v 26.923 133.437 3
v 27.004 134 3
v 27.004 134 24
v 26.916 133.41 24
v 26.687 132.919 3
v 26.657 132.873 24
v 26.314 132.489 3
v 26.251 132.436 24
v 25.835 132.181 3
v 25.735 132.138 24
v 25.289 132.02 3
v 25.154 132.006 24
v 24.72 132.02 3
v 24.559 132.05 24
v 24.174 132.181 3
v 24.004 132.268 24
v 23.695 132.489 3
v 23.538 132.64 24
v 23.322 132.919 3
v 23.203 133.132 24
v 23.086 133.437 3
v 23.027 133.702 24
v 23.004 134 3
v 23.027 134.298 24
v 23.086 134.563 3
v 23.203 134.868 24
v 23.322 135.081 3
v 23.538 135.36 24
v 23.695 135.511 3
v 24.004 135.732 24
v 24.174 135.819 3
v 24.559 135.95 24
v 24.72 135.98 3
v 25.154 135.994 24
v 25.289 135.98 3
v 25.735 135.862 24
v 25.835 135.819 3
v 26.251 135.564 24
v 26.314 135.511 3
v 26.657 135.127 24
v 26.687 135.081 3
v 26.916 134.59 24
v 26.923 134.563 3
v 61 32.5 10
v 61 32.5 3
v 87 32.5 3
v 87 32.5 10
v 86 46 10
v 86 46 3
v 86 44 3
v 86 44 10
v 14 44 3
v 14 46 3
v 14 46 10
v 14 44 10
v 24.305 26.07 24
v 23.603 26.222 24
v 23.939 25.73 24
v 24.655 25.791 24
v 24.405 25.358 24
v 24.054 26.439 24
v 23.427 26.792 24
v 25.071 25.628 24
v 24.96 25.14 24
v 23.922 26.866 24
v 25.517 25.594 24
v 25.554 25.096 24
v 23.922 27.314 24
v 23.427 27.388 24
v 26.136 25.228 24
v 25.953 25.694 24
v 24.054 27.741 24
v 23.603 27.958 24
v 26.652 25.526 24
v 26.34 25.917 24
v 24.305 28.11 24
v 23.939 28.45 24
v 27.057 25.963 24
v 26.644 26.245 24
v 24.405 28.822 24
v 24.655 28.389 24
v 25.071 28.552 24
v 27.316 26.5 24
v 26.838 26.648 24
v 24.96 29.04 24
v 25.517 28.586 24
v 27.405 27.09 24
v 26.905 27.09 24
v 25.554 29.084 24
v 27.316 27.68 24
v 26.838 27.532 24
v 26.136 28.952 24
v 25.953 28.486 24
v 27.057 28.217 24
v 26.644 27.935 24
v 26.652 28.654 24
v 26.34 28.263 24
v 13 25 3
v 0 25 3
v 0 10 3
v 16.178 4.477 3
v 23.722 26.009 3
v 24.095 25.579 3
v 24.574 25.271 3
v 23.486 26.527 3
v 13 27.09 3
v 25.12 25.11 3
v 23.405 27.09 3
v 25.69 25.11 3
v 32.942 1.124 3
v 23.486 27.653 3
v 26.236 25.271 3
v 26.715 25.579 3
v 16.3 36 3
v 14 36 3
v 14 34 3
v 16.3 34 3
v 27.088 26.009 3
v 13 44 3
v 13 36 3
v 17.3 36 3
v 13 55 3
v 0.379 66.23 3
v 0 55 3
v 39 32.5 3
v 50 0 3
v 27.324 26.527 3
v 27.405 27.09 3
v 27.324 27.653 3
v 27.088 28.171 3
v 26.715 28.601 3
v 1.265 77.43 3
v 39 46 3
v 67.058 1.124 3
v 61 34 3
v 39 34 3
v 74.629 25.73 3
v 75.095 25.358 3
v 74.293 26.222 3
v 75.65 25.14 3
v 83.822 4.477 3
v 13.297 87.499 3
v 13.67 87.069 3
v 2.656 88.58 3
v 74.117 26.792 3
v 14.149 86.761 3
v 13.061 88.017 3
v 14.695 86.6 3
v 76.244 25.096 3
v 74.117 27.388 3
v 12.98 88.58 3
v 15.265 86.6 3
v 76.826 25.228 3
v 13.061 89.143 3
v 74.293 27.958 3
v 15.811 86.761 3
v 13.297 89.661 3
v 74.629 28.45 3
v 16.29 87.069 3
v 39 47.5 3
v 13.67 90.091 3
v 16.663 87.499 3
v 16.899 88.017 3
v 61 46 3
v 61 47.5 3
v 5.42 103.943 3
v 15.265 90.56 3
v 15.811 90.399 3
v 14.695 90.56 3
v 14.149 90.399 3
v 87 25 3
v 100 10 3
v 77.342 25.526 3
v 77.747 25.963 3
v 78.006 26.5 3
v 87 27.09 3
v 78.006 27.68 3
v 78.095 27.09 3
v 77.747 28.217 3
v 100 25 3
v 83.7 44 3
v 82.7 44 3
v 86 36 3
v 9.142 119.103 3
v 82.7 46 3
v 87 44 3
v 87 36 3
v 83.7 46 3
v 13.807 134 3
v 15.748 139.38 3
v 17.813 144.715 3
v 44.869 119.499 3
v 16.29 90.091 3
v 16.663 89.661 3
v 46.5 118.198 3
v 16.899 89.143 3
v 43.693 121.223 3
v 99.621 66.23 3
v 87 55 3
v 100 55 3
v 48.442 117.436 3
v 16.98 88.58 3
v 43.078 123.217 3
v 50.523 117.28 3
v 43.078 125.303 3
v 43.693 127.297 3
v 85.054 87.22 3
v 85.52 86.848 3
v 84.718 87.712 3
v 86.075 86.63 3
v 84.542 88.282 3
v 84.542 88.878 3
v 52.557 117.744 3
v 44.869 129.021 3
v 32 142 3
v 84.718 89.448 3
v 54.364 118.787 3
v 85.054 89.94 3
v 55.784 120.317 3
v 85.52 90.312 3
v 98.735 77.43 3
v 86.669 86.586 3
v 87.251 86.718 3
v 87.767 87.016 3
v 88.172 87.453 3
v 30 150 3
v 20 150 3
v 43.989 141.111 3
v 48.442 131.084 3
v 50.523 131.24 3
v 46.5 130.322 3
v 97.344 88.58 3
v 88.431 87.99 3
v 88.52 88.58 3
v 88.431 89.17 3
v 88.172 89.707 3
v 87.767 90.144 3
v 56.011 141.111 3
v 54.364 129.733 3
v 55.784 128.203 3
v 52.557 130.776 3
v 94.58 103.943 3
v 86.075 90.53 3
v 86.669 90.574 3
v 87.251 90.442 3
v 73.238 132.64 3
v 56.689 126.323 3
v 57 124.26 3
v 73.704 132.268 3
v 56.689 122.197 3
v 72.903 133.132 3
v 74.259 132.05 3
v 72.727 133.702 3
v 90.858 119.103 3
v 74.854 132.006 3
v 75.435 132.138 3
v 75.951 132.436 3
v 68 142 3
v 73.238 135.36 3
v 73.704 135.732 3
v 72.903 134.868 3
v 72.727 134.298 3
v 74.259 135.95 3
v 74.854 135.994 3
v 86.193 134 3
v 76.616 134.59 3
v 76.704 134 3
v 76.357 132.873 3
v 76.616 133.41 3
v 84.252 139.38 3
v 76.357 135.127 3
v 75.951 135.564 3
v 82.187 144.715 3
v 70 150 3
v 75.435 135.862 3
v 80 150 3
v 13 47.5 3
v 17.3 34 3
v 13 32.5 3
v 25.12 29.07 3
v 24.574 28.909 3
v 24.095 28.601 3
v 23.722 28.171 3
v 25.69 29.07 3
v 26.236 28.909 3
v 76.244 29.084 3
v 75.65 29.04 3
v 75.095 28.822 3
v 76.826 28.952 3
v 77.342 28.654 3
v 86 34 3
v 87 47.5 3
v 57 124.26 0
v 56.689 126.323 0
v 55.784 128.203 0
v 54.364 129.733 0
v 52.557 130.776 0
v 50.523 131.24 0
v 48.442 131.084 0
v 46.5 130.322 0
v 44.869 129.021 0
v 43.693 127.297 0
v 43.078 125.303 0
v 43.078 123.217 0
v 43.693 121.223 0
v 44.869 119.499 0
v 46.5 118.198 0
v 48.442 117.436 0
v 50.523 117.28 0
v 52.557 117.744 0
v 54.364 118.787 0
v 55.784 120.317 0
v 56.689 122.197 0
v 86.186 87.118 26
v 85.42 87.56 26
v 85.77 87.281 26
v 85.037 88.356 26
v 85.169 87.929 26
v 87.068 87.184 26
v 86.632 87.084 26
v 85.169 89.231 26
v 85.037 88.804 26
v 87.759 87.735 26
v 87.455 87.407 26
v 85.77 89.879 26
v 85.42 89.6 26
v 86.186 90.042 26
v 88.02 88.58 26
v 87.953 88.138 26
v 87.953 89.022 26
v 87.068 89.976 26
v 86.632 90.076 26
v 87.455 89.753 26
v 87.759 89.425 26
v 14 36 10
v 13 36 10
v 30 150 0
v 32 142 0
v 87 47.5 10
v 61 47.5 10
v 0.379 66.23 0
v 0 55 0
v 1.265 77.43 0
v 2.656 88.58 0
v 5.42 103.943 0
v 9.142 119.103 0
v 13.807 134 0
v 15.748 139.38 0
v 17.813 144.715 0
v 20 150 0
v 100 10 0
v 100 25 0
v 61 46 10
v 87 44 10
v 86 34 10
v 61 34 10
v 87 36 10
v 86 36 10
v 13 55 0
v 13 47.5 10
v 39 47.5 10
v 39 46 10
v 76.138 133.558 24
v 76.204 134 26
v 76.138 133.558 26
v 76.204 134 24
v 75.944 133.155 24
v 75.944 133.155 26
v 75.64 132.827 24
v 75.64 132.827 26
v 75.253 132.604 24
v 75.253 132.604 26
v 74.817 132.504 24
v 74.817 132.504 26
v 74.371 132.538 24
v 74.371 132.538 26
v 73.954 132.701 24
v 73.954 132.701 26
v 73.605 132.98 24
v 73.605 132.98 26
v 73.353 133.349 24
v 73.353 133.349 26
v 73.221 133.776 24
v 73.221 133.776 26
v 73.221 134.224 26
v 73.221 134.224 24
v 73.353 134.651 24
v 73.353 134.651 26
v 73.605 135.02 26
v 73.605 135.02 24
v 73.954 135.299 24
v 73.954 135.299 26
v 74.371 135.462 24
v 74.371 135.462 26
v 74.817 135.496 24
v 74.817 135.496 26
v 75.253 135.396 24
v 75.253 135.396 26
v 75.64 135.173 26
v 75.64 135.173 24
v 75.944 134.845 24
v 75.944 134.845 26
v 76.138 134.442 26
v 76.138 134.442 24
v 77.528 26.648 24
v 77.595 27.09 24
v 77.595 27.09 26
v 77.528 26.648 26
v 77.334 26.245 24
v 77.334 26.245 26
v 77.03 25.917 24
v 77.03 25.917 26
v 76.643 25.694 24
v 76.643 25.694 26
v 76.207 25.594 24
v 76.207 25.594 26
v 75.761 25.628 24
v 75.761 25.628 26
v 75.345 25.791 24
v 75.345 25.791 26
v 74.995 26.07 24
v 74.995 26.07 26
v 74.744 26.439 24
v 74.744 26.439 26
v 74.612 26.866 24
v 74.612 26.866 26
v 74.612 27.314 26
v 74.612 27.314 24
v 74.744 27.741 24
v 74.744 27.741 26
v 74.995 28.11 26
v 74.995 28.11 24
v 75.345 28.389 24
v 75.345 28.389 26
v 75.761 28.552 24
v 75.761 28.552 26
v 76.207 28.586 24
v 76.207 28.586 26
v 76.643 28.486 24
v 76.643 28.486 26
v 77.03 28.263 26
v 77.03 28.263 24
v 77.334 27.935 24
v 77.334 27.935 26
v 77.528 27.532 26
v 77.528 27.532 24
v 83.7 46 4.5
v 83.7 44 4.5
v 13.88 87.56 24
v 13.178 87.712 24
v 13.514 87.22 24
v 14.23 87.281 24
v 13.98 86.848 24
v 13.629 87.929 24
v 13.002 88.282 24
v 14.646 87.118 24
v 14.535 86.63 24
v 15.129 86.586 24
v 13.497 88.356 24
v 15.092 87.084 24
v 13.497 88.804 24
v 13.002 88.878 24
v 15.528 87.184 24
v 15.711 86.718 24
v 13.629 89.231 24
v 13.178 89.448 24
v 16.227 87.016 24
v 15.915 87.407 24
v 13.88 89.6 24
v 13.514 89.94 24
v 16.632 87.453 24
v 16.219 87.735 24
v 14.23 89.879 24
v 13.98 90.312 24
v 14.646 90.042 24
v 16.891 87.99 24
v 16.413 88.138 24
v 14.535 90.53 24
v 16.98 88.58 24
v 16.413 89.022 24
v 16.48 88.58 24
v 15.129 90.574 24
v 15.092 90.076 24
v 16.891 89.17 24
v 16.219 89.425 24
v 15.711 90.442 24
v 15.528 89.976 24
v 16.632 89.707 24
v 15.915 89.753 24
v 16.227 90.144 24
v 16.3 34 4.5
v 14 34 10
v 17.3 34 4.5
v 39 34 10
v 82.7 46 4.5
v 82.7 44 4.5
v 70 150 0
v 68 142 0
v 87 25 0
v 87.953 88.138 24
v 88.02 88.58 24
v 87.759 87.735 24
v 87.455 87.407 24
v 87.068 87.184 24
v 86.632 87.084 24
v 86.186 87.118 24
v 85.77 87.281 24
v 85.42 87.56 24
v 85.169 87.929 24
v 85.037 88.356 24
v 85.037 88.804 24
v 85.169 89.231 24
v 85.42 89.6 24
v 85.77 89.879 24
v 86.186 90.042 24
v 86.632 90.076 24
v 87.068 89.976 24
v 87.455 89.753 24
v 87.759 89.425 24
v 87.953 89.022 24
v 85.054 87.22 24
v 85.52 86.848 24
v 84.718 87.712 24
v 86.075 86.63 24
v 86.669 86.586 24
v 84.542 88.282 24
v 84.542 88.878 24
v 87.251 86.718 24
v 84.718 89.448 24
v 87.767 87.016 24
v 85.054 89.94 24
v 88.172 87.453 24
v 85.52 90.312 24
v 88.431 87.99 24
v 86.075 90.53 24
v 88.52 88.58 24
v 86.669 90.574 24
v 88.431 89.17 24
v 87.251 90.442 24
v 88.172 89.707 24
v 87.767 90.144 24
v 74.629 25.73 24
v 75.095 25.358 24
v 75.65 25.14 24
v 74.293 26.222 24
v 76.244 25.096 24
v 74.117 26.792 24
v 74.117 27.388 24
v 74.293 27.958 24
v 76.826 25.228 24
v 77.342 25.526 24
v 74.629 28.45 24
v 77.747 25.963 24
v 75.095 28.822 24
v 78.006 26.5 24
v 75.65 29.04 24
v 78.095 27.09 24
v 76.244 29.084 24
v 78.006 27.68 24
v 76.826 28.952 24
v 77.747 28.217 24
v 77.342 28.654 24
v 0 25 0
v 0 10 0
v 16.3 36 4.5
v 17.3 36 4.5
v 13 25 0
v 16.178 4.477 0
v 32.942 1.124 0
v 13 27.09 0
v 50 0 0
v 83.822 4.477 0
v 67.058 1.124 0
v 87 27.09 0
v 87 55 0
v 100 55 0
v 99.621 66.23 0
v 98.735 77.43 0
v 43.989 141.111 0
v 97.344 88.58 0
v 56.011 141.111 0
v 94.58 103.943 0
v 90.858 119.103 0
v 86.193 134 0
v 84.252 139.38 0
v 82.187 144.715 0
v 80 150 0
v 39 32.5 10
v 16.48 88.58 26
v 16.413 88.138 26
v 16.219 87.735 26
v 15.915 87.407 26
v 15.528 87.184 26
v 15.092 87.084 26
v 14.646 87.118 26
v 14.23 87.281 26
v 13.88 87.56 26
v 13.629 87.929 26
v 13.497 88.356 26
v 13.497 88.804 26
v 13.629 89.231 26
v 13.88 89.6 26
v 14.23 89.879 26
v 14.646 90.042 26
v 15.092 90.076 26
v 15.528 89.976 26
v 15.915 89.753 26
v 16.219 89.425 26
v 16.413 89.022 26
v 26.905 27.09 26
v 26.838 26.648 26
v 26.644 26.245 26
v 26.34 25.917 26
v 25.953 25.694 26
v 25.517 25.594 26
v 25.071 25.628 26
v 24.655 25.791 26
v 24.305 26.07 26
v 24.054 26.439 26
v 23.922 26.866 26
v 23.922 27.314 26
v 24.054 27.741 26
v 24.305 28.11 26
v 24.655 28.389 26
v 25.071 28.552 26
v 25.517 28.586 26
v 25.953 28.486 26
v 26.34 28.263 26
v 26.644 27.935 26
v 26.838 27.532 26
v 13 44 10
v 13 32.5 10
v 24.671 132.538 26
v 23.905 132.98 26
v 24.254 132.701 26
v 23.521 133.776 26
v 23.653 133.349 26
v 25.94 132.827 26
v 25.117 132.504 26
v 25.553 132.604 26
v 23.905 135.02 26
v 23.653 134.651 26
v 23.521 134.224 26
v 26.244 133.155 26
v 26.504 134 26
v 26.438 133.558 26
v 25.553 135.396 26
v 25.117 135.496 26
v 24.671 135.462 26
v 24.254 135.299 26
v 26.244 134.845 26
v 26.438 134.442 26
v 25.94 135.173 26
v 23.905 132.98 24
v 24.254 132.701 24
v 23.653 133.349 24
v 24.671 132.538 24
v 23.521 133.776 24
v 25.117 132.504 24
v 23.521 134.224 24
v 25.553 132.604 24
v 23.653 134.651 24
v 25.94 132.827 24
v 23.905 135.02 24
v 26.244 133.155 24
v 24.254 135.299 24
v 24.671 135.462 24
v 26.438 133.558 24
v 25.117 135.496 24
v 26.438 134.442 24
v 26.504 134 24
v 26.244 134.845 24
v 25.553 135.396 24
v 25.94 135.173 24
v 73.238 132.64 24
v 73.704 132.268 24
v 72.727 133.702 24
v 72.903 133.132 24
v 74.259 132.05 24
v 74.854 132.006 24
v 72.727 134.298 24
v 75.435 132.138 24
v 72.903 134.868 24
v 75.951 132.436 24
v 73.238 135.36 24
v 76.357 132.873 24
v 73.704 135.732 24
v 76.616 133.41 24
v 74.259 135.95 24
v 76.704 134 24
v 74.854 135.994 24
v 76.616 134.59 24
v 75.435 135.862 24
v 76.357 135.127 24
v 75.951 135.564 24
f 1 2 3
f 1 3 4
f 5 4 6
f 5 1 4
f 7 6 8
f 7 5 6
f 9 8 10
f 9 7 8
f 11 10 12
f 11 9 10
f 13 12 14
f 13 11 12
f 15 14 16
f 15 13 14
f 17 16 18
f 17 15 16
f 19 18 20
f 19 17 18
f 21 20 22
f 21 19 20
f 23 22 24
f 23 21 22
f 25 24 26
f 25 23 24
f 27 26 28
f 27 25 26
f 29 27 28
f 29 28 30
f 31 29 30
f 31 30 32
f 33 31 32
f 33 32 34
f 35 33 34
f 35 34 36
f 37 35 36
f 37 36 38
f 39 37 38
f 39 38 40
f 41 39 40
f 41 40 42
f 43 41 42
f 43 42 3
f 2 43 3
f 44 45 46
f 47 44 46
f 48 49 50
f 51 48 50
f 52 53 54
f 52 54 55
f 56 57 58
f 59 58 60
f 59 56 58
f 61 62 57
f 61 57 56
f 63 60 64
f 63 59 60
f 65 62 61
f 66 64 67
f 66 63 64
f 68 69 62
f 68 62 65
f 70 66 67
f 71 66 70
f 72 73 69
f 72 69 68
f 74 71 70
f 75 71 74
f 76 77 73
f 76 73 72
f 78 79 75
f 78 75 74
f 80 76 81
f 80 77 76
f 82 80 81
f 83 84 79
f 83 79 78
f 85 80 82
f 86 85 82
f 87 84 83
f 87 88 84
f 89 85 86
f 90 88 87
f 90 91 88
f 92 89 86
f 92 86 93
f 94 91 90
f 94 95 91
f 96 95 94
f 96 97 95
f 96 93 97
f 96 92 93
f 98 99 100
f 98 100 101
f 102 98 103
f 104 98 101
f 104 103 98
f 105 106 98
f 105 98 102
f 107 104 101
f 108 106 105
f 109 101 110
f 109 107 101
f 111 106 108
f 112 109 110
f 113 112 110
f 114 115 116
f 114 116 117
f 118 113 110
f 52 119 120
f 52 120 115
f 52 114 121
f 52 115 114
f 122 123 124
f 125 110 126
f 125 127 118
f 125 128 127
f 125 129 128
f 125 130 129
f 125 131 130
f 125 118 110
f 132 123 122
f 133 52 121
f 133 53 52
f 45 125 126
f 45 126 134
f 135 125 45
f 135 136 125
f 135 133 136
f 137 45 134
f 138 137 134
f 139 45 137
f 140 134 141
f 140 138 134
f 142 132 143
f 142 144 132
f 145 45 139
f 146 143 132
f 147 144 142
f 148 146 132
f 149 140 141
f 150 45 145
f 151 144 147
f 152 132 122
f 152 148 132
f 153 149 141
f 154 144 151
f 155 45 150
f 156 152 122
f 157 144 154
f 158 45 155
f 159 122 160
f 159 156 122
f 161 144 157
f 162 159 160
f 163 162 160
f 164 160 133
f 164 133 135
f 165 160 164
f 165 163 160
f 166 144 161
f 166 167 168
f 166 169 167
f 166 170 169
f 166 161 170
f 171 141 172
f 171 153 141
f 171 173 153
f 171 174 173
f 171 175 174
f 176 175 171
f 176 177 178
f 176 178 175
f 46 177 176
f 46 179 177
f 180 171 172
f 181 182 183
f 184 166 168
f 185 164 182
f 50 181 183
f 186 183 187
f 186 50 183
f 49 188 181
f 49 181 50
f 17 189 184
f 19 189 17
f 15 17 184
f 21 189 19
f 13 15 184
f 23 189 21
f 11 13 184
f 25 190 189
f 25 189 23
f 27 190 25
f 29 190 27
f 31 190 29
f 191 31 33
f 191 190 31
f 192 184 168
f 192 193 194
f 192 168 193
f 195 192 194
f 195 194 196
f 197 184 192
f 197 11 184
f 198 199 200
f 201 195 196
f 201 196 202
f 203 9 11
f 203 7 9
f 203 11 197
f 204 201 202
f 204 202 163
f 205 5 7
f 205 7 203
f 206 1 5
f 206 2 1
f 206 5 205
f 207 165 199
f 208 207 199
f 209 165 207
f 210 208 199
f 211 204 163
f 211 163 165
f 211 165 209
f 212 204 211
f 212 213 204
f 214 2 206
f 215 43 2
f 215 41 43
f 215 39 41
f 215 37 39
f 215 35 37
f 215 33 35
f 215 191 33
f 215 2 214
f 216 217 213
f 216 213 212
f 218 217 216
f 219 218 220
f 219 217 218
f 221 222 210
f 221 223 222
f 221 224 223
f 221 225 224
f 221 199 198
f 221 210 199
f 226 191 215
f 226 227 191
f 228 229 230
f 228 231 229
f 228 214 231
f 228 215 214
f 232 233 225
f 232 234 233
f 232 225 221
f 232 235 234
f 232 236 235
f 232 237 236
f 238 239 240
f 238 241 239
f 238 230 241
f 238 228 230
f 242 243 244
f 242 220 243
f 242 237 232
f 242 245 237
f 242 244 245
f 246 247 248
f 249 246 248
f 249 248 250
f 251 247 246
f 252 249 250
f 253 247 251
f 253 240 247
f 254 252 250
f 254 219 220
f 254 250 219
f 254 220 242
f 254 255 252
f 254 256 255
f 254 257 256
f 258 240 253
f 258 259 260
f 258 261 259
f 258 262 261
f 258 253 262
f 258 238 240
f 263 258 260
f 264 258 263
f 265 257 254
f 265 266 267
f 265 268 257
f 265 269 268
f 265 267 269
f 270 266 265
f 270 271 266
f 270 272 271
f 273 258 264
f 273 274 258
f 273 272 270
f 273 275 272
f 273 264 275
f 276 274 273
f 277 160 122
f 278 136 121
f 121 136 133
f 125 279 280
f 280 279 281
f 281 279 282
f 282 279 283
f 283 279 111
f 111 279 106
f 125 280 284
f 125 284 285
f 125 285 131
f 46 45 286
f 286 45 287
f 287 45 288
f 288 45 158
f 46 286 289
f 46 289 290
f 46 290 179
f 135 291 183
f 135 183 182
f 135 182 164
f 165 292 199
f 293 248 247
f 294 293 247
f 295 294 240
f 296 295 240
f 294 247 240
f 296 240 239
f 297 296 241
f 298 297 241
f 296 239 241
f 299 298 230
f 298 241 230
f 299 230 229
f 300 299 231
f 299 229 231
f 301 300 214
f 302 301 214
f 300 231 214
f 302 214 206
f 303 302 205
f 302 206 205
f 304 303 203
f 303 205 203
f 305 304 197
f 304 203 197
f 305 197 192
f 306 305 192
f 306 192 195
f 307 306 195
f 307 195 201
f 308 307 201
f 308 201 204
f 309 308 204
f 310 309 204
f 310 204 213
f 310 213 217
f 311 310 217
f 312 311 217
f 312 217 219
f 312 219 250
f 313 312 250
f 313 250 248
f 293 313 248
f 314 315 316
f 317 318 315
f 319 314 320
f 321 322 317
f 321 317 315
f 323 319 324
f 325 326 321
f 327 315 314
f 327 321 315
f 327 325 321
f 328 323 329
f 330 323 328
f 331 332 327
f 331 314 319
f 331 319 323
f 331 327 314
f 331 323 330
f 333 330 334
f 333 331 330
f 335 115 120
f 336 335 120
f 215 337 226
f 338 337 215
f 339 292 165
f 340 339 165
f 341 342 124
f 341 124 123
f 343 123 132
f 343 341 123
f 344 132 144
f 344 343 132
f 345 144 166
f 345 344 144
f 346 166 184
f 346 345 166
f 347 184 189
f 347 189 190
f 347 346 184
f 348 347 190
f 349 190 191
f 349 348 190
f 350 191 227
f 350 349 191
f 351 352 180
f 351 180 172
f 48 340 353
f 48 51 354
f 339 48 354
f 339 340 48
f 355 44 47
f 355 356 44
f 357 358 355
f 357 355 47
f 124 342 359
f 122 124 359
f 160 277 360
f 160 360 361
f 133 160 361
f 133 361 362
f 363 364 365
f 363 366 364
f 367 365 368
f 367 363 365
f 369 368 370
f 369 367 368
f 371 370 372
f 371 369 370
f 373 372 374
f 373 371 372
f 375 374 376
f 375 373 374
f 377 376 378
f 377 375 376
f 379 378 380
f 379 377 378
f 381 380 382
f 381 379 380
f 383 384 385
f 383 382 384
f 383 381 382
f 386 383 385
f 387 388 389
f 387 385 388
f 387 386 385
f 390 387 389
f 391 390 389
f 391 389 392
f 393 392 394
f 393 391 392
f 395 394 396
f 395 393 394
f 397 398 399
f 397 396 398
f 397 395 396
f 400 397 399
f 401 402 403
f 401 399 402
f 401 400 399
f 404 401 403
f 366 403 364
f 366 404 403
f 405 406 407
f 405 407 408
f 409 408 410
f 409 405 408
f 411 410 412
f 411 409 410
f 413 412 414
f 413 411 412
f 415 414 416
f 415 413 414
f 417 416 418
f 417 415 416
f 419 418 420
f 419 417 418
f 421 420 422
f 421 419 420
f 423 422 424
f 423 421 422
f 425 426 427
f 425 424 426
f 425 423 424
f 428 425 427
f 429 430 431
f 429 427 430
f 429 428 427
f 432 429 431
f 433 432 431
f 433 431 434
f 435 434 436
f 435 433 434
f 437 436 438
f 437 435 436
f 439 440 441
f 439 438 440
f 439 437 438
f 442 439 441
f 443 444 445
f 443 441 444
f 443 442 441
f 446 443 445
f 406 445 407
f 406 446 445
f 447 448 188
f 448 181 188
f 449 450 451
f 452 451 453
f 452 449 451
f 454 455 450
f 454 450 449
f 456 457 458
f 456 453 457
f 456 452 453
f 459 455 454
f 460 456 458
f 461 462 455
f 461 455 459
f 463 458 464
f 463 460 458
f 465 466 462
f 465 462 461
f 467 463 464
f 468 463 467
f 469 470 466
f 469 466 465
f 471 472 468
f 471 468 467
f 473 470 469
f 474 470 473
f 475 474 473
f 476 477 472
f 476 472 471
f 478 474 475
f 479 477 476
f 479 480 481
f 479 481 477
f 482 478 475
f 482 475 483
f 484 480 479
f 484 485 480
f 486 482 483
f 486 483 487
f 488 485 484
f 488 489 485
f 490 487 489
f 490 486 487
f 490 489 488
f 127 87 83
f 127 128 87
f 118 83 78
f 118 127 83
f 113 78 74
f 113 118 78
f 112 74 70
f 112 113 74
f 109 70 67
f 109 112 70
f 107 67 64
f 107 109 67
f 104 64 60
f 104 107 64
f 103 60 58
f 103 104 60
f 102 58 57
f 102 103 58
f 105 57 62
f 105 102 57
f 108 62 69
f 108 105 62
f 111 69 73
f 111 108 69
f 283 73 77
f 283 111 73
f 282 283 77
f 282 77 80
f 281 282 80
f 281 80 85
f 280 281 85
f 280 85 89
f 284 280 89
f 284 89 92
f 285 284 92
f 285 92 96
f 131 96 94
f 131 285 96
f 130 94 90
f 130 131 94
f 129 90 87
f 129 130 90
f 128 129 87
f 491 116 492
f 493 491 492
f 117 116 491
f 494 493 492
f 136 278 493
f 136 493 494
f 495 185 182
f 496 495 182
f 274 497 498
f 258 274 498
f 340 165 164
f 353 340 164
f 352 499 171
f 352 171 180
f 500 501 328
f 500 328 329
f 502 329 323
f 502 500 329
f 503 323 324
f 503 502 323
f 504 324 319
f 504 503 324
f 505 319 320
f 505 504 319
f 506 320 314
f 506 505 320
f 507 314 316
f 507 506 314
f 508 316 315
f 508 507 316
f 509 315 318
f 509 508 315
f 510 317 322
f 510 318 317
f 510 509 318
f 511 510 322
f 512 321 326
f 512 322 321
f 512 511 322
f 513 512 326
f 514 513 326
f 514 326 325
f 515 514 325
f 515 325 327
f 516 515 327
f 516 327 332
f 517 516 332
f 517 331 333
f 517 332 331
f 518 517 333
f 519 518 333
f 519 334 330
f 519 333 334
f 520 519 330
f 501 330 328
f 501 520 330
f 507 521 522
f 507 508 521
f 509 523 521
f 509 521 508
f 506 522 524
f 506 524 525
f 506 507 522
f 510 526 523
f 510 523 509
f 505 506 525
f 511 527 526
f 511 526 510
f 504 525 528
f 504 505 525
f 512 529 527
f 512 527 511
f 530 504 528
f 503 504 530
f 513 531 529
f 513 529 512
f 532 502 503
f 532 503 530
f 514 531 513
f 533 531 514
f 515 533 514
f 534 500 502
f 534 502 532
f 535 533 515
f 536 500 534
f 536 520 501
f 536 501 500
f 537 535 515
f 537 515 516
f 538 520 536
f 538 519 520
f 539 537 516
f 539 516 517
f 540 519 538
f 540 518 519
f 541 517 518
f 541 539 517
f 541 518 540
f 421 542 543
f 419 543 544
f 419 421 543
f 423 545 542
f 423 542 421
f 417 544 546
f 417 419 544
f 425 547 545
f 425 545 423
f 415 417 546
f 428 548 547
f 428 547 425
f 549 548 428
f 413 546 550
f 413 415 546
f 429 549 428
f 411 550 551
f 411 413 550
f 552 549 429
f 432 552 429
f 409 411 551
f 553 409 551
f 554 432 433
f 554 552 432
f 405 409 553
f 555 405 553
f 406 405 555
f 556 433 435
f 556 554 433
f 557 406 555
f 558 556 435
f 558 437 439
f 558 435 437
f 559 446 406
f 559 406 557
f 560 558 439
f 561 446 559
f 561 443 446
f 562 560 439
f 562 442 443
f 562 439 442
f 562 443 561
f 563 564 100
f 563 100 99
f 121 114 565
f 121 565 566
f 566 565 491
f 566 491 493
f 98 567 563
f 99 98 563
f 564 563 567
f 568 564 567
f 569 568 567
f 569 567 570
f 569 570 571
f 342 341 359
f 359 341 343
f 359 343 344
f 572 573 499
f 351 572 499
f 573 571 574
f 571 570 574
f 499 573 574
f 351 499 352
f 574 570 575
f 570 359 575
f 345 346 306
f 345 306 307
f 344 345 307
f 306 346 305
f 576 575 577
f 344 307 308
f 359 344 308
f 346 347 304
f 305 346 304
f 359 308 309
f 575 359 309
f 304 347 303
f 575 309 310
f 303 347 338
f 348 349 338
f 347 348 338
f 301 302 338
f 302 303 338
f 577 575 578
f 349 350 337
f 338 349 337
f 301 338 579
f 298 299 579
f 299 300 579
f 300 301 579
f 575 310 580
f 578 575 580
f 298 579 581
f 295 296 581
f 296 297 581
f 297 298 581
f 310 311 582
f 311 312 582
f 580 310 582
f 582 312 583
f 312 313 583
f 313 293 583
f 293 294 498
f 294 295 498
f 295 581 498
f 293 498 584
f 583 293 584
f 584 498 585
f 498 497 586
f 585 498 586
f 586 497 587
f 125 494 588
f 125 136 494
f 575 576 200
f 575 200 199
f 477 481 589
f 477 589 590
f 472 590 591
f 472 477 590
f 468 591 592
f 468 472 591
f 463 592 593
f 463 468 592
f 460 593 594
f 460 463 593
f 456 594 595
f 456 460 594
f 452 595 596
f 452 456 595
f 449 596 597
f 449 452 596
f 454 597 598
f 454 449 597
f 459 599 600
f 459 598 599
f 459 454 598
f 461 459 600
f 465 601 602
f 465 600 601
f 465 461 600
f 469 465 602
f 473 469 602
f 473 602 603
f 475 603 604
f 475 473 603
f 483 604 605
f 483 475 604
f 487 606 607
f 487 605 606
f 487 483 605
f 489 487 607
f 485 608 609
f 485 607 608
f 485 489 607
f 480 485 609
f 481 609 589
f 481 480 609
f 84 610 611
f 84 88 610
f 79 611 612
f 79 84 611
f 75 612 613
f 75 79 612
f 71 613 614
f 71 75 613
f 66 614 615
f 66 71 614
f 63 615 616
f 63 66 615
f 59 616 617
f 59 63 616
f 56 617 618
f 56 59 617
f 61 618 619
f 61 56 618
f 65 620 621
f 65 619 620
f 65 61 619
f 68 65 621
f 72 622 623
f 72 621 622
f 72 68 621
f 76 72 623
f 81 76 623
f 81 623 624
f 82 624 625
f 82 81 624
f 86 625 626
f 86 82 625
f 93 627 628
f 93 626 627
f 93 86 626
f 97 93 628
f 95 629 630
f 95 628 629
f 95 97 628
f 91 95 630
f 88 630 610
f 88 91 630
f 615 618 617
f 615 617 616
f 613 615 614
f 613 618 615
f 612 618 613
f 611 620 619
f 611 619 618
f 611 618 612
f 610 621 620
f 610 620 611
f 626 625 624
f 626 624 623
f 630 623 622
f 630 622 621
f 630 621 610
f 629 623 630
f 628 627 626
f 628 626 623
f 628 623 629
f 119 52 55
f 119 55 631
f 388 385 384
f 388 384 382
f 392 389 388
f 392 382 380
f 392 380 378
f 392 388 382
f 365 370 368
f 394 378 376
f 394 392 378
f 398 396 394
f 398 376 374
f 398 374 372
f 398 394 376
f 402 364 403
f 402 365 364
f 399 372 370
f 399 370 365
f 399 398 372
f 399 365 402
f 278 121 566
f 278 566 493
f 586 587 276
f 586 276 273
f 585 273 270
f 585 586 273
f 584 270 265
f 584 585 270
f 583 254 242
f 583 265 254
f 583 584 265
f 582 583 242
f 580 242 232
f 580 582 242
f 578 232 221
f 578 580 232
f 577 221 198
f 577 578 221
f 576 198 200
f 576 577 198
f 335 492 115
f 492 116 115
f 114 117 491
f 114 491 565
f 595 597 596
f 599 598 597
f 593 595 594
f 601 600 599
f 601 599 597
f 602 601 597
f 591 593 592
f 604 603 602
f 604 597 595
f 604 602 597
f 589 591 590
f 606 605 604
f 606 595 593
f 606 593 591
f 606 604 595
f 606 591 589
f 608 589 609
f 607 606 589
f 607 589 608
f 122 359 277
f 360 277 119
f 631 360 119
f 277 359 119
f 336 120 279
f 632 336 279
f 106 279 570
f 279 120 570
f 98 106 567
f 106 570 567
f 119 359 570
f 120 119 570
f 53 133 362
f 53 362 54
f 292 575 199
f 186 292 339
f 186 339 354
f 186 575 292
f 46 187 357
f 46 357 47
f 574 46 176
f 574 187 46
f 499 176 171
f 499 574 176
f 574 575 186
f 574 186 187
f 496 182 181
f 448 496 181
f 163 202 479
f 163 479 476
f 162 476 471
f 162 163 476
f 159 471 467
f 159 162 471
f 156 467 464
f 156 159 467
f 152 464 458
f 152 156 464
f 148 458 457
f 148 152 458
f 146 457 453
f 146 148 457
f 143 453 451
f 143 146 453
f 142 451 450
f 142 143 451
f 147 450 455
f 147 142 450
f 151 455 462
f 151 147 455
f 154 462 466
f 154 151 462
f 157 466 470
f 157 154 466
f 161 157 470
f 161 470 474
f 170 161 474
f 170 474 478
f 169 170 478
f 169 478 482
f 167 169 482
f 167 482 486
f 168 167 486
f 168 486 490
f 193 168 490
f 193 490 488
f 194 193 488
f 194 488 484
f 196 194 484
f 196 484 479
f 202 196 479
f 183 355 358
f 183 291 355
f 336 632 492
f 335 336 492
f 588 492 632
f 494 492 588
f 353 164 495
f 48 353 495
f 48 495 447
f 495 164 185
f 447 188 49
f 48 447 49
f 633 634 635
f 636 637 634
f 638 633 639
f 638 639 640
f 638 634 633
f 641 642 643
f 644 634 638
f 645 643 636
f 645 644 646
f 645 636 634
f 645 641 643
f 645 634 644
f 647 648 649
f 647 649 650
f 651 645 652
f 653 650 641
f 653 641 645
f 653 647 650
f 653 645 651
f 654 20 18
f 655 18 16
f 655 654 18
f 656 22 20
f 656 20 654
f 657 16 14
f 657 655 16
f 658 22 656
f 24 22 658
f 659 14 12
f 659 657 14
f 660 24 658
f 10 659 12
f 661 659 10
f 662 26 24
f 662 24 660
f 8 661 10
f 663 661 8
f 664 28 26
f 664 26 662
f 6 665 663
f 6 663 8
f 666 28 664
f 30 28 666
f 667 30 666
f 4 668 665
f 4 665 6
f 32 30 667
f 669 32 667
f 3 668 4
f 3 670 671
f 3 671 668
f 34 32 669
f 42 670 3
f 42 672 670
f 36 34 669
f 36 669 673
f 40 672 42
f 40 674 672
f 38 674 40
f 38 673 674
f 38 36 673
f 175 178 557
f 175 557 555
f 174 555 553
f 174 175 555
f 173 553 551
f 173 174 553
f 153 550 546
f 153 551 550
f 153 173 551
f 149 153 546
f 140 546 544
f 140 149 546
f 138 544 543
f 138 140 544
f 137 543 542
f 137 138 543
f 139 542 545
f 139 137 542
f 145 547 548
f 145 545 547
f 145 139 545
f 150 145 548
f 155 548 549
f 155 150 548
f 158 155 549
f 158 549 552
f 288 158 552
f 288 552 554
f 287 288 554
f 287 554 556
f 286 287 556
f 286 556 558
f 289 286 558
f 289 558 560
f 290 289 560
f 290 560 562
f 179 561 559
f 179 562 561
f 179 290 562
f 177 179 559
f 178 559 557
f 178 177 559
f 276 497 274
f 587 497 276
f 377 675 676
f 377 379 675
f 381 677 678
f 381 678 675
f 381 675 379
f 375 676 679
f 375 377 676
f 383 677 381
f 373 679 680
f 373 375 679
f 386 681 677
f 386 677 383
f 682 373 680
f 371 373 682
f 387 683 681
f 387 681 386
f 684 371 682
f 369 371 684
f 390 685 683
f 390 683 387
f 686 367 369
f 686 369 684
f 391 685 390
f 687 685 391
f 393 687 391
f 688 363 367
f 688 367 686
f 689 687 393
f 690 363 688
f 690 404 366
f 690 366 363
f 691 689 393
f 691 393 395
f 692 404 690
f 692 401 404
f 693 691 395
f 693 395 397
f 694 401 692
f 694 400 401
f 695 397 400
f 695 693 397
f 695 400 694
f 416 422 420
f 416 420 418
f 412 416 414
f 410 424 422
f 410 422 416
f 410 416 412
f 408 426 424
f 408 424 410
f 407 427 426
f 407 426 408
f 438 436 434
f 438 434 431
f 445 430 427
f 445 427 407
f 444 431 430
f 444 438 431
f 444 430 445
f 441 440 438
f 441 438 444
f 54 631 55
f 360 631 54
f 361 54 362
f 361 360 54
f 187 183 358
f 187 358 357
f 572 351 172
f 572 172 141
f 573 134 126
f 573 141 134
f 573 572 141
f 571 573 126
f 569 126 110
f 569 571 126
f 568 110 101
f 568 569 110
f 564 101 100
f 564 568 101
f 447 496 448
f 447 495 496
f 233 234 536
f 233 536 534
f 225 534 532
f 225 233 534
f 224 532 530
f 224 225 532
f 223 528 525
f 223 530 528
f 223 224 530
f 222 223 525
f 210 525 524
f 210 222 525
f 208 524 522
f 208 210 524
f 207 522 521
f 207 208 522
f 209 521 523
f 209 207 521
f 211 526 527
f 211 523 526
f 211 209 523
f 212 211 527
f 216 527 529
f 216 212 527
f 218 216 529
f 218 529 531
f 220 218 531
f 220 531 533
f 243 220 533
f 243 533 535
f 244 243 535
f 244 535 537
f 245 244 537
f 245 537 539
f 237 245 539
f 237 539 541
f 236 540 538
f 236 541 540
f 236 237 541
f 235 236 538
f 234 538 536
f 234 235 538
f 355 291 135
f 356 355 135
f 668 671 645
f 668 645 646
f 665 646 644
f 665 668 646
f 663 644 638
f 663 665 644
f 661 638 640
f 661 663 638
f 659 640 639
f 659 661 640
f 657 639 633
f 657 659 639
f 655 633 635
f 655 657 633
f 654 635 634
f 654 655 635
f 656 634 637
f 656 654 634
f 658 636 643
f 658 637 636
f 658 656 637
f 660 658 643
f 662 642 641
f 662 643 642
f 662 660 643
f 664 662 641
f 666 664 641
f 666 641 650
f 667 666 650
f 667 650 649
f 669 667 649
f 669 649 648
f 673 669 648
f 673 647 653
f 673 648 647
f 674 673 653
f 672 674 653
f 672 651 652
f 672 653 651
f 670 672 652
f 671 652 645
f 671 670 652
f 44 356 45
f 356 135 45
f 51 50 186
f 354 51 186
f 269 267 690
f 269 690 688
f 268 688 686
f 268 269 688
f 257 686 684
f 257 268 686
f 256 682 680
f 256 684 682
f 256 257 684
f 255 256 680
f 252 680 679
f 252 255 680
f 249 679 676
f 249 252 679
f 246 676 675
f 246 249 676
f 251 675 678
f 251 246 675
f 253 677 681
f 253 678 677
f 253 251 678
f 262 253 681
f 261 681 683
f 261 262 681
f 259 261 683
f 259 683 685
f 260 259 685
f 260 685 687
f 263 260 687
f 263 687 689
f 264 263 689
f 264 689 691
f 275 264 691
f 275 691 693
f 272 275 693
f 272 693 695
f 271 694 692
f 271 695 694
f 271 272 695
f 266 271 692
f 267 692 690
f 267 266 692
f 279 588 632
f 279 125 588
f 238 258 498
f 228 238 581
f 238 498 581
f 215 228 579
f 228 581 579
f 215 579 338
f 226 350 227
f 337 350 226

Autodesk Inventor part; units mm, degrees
ref_plane "YZ Plane" through (0, 0, 0) normal (1, 0, 0) x (0, 1, 0)
ref_plane "XZ Plane" through (0, 0, 0) normal (0, 1, 0) x (-1, 0, 0)
ref_plane "XY Plane" through (0, 0, 0) normal (0, 0, 1) x (1, 0, 0)
sketch "Sketch1" plane through (0, 0, 0) normal (0, 0, 1) x (1, 0, 0)
  arc A0 (0, 10) -> (100, 10) centre (50, 130) ccw
  line L0 (0, 55) -> (13, 55)
  line L1 (13, 55) -> (13, 25)
  line L2 (13, 25) -> (0, 25)
  line L3 (13, 47.5) -> (39, 47.5)
  line L4 (39, 47.5) -> (39, 46)
  line L5 (39, 46) -> (13, 46)
  line L6 (13, 46) -> (13, 47.5)
  line L7 (13, 34) -> (39, 34)
  line L8 (39, 34) -> (39, 32.5)
  line L9 (39, 32.5) -> (13, 32.5)
  line L10 (13, 46) -> (14, 46)
  line L11 (14, 46) -> (14, 44)
  line L12 (14, 44) -> (13, 44)
  line L13 (13, 44) -> (13, 46)
  line L14 (13, 34) -> (14, 34)
  line L15 (14, 34) -> (14, 36)
  line L16 (14, 36) -> (13, 36)
  line L17 (13, 36) -> (13, 34)
  line L18 (30, 150) -> (32, 142)
  arc A1 (32, 142) -> (50, 141) centre (50, 303.5) ccw
  line L19 (100, 55) -> (87, 55)
  line L20 (87, 55) -> (87, 25)
  line L21 (87, 25) -> (100, 25)
  line L22 (87, 47.5) -> (61, 47.5)
  line L23 (61, 47.5) -> (61, 46)
  line L24 (61, 46) -> (87, 46)
  line L25 (87, 46) -> (87, 47.5)
  line L26 (61, 34) -> (61, 32.5)
  line L27 (87, 34) -> (61, 34)
  line L28 (61, 32.5) -> (87, 32.5)
  line L29 (87, 46) -> (86, 46)
  line L30 (86, 46) -> (86, 44)
  line L31 (86, 44) -> (87, 44)
  line L32 (87, 44) -> (87, 46)
  line L33 (87, 34) -> (86, 34)
  line L34 (86, 34) -> (86, 36)
  line L35 (86, 36) -> (87, 36)
  line L36 (87, 36) -> (87, 34)
  line L37 (70, 150) -> (68, 142)
  arc A2 (50, 141) -> (68, 142) centre (50, 303.5) ccw
  arc A3 (100, 55) -> (80, 150) centre (-148.869, 52.2118) ccw
  line L38 (70, 150) -> (80, 150)
  line L39 (20, 150) -> (30, 150)
  line L40 (100, 25) -> (100, 10)
  line L41 (0, 10) -> (0, 25)
  circle A4 centre (25.0045, 134) radius 1.5 construction
  circle A5 centre (74.7045, 134) radius 1.5 construction
  line L42 (16.9872, 134) -> (99.6032, 134) construction
  line L43 (12.0158, 134) -> (23.5045, 134)
  line L44 (74.7045, 134) -> (86.1932, 134)
  circle A6 centre (25.0045, 134) radius 2
  circle A7 centre (74.7045, 134) radius 2
  circle A8 centre (14.98, 88.58) radius 1.5 construction
  circle A9 centre (86.52, 88.58) radius 1.5 construction
  line L45 (16.652, 88.58) -> (99.2681, 88.58) construction
  line L46 (2.6559, 88.58) -> (13.48, 88.58)
  line L47 (86.52, 88.58) -> (97.3441, 88.58)
  circle A10 centre (14.98, 88.58) radius 2
  circle A11 centre (86.52, 88.58) radius 2
  line L48 (13, 50.0336) -> (87, 50.0336) construction
  line L49 (50, 50.0336) -> (50, 74.1687) construction
  arc A12 (20, 150) -> (0, 55) centre (248.869, 52.2118) ccw
  line L50 (0, 27.09) -> (23.905, 27.09)
  circle A13 centre (25.405, 27.09) radius 1.5 construction
  circle A14 centre (25.405, 27.09) radius 2
  circle A15 centre (76.095, 27.09) radius 1.5 construction
  circle A16 centre (76.095, 27.09) radius 2
  line L51 (30.9298, 27.09) -> (113.5459, 27.09) construction
  line L52 (76.095, 27.09) -> (100, 27.09)
  point P0 (0, 0)
  point P1 (75, 150)
  point P2 (50.8983, 94.4188)
  point P3 (62.5692, 16.9025)
  dimension "d68" = 3
  dimension "d74" = 3
  dimension "d80" = 3
  dimension "d10" = 10
  dimension "d12" = 30
  dimension "d13" = 13
  dimension "d14" = 15
  dimension "d15" = 26
  dimension "d16" = 1.5
  dimension "d19" = 26
  dimension "d20" = 1.5
  dimension "d23" = 7.5
  dimension "d24" = 12
  dimension "d25" = 1
  dimension "d26" = 2
  dimension "d27" = 1
  dimension "d28" = 2
  dimension "d35" = 10
  dimension "d69" = 3
  dimension "d70" = 46.7
  dimension "d71" = 16
  dimension "d72" = 4
  dimension "d73" = 4
  dimension "d75" = 3
  dimension "d76" = 68.54
  dimension "d77" = 4
  dimension "d78" = 4
  dimension "d79" = 45.42
  dimension "d81" = 3
  dimension "d83" = 4
  dimension "d84" = 4
  dimension "d86" = 61.49
  dimension "d107" = 46.69
extrude "Extrusion1" add sketch "Sketch1" along normal blind 10 contours L1 L7 L8 L9 | L28 L26 L27 L20 | L1 L16 L15 L7 | L27 L34 L35 L20 | L1 L5 L11 L12 | L31 L30 L24 L20 | L1 L3 L4 L5 | L24 L23 L22 L20
extrude "Extrusion3" add sketch "Sketch1" along normal blind 3 contours L41 L2 L1 L9 L8 L7 L15 L16 L12 L11 L5 L4 L3 L0 A12 L39 L18 A1 A2 L37 L38 A3 L19 L20 L22 L23 L24 L30 L31 L35 L34 L27 L26 L28 L21 L40 A0
sketch "Sketch2" plane through (0, 0, 3) normal (0, 0, 1) x (1, 0, 0)
  line L0 (39, 34) -> (14, 34) projected
  line L1 (17.3, 34) -> (16.3, 34)
  line L2 (16.3, 34) -> (16.3, 36)
  line L3 (16.3, 36) -> (17.3, 36)
  line L4 (17.3, 36) -> (17.3, 34)
  line L5 (14, 34) -> (14, 36) projected
  line L6 (61, 46) -> (86, 46) projected
  line L7 (83.7, 46) -> (82.7, 46)
  line L8 (82.7, 46) -> (82.7, 44)
  line L9 (82.7, 44) -> (83.7, 44)
  line L10 (83.7, 44) -> (83.7, 46)
  line L11 (86, 46) -> (86, 44) projected
  point P0 (0, 0)
  point P1 (14, 35)
  dimension "d89" = 1
  dimension "d90" = 2
  dimension "d91" = 2.3
  dimension "d92" = 1
  dimension "d93" = 2
  dimension "d94" = 2.3
extrude "Extrusion4" add sketch "Sketch2" along normal blind 1.5
extrude "Extrusion5" add sketch "Sketch1" along normal blind 24 contours A16 | A11 | A7 | A6 | A10 | A14
sketch "Sketch4" plane through (74.7045, 134, 24) normal (0, 0, 1) x (1, 0, 0)
  circle A0 centre (-49.7, 0) radius 2 projected
  circle A1 centre (-49.7, 0) radius 1.5
  circle A2 centre (0, 0) radius 2 projected
  circle A3 centre (0, 0) radius 1.5
  circle A4 centre (-59.7245, -45.42) radius 2 projected
  circle A5 centre (-59.7245, -45.42) radius 1.5
  circle A6 centre (11.8155, -45.42) radius 2 projected
  circle A7 centre (11.8155, -45.42) radius 1.5
  circle A8 centre (1.3905, -106.91) radius 2 projected
  circle A9 centre (1.3905, -106.91) radius 1.5
  circle A10 centre (-49.2995, -106.91) radius 2 projected
  circle A11 centre (-49.2995, -106.91) radius 1.5
  point P0 (-74.7045, -134)
  dimension "d99" = 3
  dimension "d100" = 3
  dimension "d101" = 3
  dimension "d102" = 3
  dimension "d103" = 3
  dimension "d104" = 3
extrude "Extrusion6" add sketch "Sketch4" along normal blind 2 contours A1 | A3 | A5 | A7 | A9 | A11
sketch "Sketch5" plane through (0, 0, 3) normal (0, 0, 1) x (1, 0, 0)
  circle A0 centre (50, 124.26) radius 7
  point P0 (0, 0)
  dimension "d108" = 14
extrude "Extrusion7" cut sketch "Sketch5" against normal blind 10
